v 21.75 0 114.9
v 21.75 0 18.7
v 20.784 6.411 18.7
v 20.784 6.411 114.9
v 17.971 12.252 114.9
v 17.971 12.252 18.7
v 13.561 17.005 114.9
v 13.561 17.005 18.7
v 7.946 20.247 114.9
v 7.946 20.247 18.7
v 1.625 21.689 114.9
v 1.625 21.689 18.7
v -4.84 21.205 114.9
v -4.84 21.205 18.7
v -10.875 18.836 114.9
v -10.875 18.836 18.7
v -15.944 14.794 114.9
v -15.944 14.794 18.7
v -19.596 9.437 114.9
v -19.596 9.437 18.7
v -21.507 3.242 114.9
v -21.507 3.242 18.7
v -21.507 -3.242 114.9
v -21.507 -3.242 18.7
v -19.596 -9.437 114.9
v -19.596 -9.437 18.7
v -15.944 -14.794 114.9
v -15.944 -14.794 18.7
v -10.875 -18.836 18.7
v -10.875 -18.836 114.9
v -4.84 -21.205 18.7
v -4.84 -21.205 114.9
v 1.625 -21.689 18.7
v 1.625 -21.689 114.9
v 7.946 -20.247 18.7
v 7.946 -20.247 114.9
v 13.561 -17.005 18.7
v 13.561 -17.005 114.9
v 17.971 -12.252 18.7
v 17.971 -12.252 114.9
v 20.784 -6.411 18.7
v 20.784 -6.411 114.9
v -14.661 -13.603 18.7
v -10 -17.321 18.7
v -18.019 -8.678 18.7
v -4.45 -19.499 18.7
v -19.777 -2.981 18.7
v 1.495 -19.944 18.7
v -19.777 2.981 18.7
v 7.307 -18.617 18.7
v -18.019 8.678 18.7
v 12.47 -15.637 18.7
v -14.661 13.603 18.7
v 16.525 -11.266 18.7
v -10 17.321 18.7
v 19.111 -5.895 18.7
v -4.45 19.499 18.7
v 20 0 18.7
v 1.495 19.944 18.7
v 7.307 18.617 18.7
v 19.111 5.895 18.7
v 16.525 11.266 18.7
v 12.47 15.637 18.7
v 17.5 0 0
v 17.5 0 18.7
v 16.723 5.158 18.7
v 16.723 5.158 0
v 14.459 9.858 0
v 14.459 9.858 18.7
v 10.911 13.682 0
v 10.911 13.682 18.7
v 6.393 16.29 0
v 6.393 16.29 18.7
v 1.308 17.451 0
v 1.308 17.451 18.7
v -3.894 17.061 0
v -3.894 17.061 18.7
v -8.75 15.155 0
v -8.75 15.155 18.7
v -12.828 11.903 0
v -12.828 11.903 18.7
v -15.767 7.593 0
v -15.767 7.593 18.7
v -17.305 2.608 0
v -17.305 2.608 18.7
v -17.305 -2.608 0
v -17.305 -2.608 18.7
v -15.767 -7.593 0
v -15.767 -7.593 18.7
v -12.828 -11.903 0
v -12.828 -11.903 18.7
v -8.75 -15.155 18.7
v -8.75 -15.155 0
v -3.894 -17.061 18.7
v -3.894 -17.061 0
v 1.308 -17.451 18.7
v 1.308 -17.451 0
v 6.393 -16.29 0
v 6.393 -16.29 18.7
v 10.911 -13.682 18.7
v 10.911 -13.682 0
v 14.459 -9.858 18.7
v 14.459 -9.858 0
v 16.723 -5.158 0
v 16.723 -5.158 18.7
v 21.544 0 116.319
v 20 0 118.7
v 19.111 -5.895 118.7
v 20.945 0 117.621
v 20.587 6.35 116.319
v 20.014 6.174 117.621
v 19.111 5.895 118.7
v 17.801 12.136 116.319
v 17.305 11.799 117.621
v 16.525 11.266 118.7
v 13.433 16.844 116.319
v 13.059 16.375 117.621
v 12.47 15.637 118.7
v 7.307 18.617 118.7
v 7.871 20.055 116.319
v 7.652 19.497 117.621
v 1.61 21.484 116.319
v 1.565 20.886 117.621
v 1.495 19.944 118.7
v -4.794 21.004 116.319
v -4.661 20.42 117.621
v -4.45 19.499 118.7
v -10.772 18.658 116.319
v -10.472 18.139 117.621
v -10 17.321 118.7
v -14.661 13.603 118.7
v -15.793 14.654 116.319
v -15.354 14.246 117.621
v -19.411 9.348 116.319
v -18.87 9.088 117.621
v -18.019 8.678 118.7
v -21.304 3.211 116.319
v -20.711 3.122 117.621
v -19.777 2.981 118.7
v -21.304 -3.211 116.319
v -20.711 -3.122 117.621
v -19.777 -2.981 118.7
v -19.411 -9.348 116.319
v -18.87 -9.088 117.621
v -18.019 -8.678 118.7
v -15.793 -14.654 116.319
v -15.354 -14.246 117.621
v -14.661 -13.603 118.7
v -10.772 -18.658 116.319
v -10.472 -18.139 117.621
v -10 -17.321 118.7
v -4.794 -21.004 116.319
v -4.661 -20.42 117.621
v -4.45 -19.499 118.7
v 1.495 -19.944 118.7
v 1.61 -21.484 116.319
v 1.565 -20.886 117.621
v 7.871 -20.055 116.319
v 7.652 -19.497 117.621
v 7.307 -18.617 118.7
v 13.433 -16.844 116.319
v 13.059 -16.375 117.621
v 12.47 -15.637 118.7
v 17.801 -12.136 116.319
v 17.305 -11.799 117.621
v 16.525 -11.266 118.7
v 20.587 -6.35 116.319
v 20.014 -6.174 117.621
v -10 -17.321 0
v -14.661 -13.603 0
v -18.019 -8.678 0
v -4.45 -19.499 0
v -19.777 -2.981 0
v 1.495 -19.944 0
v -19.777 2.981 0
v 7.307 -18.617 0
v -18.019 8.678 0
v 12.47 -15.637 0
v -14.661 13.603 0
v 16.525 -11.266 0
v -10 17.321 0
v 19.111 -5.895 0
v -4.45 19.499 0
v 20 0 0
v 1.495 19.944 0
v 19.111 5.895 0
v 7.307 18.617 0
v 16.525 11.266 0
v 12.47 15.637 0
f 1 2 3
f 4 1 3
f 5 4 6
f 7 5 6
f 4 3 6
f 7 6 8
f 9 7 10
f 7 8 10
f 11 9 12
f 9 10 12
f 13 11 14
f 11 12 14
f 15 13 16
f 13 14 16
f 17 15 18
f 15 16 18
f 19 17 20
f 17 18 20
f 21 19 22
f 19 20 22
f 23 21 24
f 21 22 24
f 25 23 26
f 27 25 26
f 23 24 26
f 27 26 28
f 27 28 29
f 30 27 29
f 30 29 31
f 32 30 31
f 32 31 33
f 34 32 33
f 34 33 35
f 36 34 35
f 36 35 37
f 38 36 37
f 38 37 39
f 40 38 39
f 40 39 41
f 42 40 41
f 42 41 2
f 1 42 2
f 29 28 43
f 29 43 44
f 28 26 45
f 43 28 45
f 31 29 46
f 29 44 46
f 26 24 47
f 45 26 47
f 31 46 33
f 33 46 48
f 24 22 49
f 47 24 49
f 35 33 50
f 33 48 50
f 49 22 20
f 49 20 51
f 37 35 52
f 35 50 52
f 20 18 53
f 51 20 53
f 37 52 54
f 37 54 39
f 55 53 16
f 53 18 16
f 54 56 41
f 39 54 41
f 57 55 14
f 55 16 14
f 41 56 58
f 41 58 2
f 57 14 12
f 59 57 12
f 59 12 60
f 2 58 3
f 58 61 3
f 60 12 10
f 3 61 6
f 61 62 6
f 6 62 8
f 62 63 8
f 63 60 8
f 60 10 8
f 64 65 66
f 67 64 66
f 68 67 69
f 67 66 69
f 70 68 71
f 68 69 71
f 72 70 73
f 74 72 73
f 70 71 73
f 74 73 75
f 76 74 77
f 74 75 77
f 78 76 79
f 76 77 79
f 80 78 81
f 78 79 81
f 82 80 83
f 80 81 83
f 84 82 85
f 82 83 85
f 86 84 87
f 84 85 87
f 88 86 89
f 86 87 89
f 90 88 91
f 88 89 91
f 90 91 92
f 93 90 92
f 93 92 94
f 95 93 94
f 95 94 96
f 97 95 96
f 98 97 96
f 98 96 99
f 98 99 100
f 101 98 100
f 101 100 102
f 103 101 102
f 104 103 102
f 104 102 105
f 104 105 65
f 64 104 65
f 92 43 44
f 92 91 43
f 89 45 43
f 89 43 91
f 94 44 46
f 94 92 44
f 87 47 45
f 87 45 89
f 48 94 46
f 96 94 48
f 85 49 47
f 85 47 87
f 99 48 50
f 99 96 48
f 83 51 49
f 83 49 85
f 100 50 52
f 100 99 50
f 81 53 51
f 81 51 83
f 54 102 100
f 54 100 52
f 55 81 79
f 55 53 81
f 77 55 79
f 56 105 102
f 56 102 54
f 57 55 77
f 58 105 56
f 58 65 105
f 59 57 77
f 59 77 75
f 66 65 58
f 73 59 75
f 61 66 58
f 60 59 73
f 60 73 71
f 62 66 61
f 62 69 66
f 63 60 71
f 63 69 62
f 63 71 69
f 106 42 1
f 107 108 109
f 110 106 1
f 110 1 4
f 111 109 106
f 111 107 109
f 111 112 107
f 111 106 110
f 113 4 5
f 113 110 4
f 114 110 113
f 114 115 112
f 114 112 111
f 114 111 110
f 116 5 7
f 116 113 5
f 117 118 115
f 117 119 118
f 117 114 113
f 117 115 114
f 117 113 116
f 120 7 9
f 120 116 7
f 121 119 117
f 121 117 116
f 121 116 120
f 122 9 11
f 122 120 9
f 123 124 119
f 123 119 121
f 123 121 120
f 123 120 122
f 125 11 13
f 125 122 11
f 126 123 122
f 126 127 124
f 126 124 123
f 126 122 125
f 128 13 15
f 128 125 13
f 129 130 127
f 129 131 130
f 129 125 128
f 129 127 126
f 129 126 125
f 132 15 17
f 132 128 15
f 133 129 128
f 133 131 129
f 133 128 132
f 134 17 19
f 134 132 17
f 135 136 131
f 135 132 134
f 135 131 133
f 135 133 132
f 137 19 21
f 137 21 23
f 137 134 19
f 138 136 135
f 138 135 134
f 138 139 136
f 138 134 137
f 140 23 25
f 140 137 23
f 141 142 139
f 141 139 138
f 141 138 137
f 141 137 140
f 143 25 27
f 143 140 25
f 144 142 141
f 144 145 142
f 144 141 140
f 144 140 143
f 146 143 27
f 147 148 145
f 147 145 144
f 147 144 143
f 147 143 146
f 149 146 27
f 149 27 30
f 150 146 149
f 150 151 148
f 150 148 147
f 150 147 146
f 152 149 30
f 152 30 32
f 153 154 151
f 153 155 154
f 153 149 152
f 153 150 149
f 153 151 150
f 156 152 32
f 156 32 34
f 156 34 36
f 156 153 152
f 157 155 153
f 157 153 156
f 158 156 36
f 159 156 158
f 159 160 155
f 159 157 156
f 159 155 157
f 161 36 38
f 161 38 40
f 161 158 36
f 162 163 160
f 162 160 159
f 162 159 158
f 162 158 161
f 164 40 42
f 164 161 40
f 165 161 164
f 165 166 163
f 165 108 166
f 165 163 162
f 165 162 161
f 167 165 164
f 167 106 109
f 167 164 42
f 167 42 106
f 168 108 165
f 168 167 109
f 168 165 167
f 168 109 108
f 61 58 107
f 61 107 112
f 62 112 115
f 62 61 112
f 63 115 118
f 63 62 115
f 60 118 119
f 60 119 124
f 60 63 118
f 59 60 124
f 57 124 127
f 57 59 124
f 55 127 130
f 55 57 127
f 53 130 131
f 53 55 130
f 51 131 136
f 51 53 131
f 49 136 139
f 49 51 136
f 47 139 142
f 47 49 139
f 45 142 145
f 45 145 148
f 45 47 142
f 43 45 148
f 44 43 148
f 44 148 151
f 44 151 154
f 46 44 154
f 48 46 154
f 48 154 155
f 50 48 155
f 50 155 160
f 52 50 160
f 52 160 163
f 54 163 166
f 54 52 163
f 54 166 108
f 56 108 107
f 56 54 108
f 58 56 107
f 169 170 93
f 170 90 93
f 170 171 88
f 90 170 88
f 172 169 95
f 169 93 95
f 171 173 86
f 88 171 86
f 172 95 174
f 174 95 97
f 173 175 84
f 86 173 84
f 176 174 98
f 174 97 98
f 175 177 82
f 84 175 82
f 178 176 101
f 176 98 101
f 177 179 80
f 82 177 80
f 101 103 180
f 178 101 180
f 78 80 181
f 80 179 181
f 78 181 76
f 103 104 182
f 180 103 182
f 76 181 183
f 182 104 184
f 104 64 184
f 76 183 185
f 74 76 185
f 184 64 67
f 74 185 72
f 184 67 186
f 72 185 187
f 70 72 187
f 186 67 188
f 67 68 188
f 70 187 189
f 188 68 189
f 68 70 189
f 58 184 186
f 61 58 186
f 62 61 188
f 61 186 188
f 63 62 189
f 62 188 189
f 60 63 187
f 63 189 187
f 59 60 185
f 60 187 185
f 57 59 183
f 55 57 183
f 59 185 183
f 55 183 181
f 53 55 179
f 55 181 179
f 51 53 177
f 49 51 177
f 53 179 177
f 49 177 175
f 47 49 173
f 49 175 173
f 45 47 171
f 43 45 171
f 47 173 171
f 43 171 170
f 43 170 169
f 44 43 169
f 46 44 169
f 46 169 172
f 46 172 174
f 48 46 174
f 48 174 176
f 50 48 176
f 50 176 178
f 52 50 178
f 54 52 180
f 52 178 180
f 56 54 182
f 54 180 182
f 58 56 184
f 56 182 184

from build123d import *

# Parameters (mm, degrees)
F0_R     = 20
F1_DEPTH = 18.7
F2_R     = 21.75
F2_R_2   = 20
F3_DEPTH = 100
F4_R     = 17.5
F5_DEPTH = 25


# Not quite as in the source:
# - a fillet or chamfer that OpenCascade refuses, or shapes differently, is made with other operations: its cross-section is extruded or revolved along the edge and cut away or added


with BuildPart() as f1:
    # F0 (on Top) → F1 (new body)
    with BuildSketch(Plane.XY):
        Circle(F0_R)
    extrude(amount=F1_DEPTH)

    # F4 (on face) → F5 (cut)
    with BuildSketch(Plane.XY.offset(18.7)):
        Circle(F4_R)
    extrude(amount=-F5_DEPTH, mode=Mode.SUBTRACT)


with BuildPart() as f3:
    # F2 (on face) → F3 (new body)
    with BuildSketch(Plane.XY.offset(18.7)):
        Circle(F2_R)
        Circle(F2_R_2, mode=Mode.SUBTRACT)
    extrude(amount=F3_DEPTH)

    # F6: fillet of radius 5 on 1 edges, made by hand

    # F6_s1 → F6_t2 (revolve, cut)
    with BuildSketch(Plane.XZ):
        with BuildLine():
            ThreePointArc((21.75, 114.9003289616), (21.2914755311, 116.9919790279), (20, 118.7))
            Line((20, 118.7), (21.75, 118.7))
            Line((21.75, 118.7), (21.75, 114.9003289616))
        make_face()
    revolve(axis=Axis((0, 0, 118.7), (0, 0, 1)), mode=Mode.SUBTRACT)


solid = Compound([f1.part, f3.part])
